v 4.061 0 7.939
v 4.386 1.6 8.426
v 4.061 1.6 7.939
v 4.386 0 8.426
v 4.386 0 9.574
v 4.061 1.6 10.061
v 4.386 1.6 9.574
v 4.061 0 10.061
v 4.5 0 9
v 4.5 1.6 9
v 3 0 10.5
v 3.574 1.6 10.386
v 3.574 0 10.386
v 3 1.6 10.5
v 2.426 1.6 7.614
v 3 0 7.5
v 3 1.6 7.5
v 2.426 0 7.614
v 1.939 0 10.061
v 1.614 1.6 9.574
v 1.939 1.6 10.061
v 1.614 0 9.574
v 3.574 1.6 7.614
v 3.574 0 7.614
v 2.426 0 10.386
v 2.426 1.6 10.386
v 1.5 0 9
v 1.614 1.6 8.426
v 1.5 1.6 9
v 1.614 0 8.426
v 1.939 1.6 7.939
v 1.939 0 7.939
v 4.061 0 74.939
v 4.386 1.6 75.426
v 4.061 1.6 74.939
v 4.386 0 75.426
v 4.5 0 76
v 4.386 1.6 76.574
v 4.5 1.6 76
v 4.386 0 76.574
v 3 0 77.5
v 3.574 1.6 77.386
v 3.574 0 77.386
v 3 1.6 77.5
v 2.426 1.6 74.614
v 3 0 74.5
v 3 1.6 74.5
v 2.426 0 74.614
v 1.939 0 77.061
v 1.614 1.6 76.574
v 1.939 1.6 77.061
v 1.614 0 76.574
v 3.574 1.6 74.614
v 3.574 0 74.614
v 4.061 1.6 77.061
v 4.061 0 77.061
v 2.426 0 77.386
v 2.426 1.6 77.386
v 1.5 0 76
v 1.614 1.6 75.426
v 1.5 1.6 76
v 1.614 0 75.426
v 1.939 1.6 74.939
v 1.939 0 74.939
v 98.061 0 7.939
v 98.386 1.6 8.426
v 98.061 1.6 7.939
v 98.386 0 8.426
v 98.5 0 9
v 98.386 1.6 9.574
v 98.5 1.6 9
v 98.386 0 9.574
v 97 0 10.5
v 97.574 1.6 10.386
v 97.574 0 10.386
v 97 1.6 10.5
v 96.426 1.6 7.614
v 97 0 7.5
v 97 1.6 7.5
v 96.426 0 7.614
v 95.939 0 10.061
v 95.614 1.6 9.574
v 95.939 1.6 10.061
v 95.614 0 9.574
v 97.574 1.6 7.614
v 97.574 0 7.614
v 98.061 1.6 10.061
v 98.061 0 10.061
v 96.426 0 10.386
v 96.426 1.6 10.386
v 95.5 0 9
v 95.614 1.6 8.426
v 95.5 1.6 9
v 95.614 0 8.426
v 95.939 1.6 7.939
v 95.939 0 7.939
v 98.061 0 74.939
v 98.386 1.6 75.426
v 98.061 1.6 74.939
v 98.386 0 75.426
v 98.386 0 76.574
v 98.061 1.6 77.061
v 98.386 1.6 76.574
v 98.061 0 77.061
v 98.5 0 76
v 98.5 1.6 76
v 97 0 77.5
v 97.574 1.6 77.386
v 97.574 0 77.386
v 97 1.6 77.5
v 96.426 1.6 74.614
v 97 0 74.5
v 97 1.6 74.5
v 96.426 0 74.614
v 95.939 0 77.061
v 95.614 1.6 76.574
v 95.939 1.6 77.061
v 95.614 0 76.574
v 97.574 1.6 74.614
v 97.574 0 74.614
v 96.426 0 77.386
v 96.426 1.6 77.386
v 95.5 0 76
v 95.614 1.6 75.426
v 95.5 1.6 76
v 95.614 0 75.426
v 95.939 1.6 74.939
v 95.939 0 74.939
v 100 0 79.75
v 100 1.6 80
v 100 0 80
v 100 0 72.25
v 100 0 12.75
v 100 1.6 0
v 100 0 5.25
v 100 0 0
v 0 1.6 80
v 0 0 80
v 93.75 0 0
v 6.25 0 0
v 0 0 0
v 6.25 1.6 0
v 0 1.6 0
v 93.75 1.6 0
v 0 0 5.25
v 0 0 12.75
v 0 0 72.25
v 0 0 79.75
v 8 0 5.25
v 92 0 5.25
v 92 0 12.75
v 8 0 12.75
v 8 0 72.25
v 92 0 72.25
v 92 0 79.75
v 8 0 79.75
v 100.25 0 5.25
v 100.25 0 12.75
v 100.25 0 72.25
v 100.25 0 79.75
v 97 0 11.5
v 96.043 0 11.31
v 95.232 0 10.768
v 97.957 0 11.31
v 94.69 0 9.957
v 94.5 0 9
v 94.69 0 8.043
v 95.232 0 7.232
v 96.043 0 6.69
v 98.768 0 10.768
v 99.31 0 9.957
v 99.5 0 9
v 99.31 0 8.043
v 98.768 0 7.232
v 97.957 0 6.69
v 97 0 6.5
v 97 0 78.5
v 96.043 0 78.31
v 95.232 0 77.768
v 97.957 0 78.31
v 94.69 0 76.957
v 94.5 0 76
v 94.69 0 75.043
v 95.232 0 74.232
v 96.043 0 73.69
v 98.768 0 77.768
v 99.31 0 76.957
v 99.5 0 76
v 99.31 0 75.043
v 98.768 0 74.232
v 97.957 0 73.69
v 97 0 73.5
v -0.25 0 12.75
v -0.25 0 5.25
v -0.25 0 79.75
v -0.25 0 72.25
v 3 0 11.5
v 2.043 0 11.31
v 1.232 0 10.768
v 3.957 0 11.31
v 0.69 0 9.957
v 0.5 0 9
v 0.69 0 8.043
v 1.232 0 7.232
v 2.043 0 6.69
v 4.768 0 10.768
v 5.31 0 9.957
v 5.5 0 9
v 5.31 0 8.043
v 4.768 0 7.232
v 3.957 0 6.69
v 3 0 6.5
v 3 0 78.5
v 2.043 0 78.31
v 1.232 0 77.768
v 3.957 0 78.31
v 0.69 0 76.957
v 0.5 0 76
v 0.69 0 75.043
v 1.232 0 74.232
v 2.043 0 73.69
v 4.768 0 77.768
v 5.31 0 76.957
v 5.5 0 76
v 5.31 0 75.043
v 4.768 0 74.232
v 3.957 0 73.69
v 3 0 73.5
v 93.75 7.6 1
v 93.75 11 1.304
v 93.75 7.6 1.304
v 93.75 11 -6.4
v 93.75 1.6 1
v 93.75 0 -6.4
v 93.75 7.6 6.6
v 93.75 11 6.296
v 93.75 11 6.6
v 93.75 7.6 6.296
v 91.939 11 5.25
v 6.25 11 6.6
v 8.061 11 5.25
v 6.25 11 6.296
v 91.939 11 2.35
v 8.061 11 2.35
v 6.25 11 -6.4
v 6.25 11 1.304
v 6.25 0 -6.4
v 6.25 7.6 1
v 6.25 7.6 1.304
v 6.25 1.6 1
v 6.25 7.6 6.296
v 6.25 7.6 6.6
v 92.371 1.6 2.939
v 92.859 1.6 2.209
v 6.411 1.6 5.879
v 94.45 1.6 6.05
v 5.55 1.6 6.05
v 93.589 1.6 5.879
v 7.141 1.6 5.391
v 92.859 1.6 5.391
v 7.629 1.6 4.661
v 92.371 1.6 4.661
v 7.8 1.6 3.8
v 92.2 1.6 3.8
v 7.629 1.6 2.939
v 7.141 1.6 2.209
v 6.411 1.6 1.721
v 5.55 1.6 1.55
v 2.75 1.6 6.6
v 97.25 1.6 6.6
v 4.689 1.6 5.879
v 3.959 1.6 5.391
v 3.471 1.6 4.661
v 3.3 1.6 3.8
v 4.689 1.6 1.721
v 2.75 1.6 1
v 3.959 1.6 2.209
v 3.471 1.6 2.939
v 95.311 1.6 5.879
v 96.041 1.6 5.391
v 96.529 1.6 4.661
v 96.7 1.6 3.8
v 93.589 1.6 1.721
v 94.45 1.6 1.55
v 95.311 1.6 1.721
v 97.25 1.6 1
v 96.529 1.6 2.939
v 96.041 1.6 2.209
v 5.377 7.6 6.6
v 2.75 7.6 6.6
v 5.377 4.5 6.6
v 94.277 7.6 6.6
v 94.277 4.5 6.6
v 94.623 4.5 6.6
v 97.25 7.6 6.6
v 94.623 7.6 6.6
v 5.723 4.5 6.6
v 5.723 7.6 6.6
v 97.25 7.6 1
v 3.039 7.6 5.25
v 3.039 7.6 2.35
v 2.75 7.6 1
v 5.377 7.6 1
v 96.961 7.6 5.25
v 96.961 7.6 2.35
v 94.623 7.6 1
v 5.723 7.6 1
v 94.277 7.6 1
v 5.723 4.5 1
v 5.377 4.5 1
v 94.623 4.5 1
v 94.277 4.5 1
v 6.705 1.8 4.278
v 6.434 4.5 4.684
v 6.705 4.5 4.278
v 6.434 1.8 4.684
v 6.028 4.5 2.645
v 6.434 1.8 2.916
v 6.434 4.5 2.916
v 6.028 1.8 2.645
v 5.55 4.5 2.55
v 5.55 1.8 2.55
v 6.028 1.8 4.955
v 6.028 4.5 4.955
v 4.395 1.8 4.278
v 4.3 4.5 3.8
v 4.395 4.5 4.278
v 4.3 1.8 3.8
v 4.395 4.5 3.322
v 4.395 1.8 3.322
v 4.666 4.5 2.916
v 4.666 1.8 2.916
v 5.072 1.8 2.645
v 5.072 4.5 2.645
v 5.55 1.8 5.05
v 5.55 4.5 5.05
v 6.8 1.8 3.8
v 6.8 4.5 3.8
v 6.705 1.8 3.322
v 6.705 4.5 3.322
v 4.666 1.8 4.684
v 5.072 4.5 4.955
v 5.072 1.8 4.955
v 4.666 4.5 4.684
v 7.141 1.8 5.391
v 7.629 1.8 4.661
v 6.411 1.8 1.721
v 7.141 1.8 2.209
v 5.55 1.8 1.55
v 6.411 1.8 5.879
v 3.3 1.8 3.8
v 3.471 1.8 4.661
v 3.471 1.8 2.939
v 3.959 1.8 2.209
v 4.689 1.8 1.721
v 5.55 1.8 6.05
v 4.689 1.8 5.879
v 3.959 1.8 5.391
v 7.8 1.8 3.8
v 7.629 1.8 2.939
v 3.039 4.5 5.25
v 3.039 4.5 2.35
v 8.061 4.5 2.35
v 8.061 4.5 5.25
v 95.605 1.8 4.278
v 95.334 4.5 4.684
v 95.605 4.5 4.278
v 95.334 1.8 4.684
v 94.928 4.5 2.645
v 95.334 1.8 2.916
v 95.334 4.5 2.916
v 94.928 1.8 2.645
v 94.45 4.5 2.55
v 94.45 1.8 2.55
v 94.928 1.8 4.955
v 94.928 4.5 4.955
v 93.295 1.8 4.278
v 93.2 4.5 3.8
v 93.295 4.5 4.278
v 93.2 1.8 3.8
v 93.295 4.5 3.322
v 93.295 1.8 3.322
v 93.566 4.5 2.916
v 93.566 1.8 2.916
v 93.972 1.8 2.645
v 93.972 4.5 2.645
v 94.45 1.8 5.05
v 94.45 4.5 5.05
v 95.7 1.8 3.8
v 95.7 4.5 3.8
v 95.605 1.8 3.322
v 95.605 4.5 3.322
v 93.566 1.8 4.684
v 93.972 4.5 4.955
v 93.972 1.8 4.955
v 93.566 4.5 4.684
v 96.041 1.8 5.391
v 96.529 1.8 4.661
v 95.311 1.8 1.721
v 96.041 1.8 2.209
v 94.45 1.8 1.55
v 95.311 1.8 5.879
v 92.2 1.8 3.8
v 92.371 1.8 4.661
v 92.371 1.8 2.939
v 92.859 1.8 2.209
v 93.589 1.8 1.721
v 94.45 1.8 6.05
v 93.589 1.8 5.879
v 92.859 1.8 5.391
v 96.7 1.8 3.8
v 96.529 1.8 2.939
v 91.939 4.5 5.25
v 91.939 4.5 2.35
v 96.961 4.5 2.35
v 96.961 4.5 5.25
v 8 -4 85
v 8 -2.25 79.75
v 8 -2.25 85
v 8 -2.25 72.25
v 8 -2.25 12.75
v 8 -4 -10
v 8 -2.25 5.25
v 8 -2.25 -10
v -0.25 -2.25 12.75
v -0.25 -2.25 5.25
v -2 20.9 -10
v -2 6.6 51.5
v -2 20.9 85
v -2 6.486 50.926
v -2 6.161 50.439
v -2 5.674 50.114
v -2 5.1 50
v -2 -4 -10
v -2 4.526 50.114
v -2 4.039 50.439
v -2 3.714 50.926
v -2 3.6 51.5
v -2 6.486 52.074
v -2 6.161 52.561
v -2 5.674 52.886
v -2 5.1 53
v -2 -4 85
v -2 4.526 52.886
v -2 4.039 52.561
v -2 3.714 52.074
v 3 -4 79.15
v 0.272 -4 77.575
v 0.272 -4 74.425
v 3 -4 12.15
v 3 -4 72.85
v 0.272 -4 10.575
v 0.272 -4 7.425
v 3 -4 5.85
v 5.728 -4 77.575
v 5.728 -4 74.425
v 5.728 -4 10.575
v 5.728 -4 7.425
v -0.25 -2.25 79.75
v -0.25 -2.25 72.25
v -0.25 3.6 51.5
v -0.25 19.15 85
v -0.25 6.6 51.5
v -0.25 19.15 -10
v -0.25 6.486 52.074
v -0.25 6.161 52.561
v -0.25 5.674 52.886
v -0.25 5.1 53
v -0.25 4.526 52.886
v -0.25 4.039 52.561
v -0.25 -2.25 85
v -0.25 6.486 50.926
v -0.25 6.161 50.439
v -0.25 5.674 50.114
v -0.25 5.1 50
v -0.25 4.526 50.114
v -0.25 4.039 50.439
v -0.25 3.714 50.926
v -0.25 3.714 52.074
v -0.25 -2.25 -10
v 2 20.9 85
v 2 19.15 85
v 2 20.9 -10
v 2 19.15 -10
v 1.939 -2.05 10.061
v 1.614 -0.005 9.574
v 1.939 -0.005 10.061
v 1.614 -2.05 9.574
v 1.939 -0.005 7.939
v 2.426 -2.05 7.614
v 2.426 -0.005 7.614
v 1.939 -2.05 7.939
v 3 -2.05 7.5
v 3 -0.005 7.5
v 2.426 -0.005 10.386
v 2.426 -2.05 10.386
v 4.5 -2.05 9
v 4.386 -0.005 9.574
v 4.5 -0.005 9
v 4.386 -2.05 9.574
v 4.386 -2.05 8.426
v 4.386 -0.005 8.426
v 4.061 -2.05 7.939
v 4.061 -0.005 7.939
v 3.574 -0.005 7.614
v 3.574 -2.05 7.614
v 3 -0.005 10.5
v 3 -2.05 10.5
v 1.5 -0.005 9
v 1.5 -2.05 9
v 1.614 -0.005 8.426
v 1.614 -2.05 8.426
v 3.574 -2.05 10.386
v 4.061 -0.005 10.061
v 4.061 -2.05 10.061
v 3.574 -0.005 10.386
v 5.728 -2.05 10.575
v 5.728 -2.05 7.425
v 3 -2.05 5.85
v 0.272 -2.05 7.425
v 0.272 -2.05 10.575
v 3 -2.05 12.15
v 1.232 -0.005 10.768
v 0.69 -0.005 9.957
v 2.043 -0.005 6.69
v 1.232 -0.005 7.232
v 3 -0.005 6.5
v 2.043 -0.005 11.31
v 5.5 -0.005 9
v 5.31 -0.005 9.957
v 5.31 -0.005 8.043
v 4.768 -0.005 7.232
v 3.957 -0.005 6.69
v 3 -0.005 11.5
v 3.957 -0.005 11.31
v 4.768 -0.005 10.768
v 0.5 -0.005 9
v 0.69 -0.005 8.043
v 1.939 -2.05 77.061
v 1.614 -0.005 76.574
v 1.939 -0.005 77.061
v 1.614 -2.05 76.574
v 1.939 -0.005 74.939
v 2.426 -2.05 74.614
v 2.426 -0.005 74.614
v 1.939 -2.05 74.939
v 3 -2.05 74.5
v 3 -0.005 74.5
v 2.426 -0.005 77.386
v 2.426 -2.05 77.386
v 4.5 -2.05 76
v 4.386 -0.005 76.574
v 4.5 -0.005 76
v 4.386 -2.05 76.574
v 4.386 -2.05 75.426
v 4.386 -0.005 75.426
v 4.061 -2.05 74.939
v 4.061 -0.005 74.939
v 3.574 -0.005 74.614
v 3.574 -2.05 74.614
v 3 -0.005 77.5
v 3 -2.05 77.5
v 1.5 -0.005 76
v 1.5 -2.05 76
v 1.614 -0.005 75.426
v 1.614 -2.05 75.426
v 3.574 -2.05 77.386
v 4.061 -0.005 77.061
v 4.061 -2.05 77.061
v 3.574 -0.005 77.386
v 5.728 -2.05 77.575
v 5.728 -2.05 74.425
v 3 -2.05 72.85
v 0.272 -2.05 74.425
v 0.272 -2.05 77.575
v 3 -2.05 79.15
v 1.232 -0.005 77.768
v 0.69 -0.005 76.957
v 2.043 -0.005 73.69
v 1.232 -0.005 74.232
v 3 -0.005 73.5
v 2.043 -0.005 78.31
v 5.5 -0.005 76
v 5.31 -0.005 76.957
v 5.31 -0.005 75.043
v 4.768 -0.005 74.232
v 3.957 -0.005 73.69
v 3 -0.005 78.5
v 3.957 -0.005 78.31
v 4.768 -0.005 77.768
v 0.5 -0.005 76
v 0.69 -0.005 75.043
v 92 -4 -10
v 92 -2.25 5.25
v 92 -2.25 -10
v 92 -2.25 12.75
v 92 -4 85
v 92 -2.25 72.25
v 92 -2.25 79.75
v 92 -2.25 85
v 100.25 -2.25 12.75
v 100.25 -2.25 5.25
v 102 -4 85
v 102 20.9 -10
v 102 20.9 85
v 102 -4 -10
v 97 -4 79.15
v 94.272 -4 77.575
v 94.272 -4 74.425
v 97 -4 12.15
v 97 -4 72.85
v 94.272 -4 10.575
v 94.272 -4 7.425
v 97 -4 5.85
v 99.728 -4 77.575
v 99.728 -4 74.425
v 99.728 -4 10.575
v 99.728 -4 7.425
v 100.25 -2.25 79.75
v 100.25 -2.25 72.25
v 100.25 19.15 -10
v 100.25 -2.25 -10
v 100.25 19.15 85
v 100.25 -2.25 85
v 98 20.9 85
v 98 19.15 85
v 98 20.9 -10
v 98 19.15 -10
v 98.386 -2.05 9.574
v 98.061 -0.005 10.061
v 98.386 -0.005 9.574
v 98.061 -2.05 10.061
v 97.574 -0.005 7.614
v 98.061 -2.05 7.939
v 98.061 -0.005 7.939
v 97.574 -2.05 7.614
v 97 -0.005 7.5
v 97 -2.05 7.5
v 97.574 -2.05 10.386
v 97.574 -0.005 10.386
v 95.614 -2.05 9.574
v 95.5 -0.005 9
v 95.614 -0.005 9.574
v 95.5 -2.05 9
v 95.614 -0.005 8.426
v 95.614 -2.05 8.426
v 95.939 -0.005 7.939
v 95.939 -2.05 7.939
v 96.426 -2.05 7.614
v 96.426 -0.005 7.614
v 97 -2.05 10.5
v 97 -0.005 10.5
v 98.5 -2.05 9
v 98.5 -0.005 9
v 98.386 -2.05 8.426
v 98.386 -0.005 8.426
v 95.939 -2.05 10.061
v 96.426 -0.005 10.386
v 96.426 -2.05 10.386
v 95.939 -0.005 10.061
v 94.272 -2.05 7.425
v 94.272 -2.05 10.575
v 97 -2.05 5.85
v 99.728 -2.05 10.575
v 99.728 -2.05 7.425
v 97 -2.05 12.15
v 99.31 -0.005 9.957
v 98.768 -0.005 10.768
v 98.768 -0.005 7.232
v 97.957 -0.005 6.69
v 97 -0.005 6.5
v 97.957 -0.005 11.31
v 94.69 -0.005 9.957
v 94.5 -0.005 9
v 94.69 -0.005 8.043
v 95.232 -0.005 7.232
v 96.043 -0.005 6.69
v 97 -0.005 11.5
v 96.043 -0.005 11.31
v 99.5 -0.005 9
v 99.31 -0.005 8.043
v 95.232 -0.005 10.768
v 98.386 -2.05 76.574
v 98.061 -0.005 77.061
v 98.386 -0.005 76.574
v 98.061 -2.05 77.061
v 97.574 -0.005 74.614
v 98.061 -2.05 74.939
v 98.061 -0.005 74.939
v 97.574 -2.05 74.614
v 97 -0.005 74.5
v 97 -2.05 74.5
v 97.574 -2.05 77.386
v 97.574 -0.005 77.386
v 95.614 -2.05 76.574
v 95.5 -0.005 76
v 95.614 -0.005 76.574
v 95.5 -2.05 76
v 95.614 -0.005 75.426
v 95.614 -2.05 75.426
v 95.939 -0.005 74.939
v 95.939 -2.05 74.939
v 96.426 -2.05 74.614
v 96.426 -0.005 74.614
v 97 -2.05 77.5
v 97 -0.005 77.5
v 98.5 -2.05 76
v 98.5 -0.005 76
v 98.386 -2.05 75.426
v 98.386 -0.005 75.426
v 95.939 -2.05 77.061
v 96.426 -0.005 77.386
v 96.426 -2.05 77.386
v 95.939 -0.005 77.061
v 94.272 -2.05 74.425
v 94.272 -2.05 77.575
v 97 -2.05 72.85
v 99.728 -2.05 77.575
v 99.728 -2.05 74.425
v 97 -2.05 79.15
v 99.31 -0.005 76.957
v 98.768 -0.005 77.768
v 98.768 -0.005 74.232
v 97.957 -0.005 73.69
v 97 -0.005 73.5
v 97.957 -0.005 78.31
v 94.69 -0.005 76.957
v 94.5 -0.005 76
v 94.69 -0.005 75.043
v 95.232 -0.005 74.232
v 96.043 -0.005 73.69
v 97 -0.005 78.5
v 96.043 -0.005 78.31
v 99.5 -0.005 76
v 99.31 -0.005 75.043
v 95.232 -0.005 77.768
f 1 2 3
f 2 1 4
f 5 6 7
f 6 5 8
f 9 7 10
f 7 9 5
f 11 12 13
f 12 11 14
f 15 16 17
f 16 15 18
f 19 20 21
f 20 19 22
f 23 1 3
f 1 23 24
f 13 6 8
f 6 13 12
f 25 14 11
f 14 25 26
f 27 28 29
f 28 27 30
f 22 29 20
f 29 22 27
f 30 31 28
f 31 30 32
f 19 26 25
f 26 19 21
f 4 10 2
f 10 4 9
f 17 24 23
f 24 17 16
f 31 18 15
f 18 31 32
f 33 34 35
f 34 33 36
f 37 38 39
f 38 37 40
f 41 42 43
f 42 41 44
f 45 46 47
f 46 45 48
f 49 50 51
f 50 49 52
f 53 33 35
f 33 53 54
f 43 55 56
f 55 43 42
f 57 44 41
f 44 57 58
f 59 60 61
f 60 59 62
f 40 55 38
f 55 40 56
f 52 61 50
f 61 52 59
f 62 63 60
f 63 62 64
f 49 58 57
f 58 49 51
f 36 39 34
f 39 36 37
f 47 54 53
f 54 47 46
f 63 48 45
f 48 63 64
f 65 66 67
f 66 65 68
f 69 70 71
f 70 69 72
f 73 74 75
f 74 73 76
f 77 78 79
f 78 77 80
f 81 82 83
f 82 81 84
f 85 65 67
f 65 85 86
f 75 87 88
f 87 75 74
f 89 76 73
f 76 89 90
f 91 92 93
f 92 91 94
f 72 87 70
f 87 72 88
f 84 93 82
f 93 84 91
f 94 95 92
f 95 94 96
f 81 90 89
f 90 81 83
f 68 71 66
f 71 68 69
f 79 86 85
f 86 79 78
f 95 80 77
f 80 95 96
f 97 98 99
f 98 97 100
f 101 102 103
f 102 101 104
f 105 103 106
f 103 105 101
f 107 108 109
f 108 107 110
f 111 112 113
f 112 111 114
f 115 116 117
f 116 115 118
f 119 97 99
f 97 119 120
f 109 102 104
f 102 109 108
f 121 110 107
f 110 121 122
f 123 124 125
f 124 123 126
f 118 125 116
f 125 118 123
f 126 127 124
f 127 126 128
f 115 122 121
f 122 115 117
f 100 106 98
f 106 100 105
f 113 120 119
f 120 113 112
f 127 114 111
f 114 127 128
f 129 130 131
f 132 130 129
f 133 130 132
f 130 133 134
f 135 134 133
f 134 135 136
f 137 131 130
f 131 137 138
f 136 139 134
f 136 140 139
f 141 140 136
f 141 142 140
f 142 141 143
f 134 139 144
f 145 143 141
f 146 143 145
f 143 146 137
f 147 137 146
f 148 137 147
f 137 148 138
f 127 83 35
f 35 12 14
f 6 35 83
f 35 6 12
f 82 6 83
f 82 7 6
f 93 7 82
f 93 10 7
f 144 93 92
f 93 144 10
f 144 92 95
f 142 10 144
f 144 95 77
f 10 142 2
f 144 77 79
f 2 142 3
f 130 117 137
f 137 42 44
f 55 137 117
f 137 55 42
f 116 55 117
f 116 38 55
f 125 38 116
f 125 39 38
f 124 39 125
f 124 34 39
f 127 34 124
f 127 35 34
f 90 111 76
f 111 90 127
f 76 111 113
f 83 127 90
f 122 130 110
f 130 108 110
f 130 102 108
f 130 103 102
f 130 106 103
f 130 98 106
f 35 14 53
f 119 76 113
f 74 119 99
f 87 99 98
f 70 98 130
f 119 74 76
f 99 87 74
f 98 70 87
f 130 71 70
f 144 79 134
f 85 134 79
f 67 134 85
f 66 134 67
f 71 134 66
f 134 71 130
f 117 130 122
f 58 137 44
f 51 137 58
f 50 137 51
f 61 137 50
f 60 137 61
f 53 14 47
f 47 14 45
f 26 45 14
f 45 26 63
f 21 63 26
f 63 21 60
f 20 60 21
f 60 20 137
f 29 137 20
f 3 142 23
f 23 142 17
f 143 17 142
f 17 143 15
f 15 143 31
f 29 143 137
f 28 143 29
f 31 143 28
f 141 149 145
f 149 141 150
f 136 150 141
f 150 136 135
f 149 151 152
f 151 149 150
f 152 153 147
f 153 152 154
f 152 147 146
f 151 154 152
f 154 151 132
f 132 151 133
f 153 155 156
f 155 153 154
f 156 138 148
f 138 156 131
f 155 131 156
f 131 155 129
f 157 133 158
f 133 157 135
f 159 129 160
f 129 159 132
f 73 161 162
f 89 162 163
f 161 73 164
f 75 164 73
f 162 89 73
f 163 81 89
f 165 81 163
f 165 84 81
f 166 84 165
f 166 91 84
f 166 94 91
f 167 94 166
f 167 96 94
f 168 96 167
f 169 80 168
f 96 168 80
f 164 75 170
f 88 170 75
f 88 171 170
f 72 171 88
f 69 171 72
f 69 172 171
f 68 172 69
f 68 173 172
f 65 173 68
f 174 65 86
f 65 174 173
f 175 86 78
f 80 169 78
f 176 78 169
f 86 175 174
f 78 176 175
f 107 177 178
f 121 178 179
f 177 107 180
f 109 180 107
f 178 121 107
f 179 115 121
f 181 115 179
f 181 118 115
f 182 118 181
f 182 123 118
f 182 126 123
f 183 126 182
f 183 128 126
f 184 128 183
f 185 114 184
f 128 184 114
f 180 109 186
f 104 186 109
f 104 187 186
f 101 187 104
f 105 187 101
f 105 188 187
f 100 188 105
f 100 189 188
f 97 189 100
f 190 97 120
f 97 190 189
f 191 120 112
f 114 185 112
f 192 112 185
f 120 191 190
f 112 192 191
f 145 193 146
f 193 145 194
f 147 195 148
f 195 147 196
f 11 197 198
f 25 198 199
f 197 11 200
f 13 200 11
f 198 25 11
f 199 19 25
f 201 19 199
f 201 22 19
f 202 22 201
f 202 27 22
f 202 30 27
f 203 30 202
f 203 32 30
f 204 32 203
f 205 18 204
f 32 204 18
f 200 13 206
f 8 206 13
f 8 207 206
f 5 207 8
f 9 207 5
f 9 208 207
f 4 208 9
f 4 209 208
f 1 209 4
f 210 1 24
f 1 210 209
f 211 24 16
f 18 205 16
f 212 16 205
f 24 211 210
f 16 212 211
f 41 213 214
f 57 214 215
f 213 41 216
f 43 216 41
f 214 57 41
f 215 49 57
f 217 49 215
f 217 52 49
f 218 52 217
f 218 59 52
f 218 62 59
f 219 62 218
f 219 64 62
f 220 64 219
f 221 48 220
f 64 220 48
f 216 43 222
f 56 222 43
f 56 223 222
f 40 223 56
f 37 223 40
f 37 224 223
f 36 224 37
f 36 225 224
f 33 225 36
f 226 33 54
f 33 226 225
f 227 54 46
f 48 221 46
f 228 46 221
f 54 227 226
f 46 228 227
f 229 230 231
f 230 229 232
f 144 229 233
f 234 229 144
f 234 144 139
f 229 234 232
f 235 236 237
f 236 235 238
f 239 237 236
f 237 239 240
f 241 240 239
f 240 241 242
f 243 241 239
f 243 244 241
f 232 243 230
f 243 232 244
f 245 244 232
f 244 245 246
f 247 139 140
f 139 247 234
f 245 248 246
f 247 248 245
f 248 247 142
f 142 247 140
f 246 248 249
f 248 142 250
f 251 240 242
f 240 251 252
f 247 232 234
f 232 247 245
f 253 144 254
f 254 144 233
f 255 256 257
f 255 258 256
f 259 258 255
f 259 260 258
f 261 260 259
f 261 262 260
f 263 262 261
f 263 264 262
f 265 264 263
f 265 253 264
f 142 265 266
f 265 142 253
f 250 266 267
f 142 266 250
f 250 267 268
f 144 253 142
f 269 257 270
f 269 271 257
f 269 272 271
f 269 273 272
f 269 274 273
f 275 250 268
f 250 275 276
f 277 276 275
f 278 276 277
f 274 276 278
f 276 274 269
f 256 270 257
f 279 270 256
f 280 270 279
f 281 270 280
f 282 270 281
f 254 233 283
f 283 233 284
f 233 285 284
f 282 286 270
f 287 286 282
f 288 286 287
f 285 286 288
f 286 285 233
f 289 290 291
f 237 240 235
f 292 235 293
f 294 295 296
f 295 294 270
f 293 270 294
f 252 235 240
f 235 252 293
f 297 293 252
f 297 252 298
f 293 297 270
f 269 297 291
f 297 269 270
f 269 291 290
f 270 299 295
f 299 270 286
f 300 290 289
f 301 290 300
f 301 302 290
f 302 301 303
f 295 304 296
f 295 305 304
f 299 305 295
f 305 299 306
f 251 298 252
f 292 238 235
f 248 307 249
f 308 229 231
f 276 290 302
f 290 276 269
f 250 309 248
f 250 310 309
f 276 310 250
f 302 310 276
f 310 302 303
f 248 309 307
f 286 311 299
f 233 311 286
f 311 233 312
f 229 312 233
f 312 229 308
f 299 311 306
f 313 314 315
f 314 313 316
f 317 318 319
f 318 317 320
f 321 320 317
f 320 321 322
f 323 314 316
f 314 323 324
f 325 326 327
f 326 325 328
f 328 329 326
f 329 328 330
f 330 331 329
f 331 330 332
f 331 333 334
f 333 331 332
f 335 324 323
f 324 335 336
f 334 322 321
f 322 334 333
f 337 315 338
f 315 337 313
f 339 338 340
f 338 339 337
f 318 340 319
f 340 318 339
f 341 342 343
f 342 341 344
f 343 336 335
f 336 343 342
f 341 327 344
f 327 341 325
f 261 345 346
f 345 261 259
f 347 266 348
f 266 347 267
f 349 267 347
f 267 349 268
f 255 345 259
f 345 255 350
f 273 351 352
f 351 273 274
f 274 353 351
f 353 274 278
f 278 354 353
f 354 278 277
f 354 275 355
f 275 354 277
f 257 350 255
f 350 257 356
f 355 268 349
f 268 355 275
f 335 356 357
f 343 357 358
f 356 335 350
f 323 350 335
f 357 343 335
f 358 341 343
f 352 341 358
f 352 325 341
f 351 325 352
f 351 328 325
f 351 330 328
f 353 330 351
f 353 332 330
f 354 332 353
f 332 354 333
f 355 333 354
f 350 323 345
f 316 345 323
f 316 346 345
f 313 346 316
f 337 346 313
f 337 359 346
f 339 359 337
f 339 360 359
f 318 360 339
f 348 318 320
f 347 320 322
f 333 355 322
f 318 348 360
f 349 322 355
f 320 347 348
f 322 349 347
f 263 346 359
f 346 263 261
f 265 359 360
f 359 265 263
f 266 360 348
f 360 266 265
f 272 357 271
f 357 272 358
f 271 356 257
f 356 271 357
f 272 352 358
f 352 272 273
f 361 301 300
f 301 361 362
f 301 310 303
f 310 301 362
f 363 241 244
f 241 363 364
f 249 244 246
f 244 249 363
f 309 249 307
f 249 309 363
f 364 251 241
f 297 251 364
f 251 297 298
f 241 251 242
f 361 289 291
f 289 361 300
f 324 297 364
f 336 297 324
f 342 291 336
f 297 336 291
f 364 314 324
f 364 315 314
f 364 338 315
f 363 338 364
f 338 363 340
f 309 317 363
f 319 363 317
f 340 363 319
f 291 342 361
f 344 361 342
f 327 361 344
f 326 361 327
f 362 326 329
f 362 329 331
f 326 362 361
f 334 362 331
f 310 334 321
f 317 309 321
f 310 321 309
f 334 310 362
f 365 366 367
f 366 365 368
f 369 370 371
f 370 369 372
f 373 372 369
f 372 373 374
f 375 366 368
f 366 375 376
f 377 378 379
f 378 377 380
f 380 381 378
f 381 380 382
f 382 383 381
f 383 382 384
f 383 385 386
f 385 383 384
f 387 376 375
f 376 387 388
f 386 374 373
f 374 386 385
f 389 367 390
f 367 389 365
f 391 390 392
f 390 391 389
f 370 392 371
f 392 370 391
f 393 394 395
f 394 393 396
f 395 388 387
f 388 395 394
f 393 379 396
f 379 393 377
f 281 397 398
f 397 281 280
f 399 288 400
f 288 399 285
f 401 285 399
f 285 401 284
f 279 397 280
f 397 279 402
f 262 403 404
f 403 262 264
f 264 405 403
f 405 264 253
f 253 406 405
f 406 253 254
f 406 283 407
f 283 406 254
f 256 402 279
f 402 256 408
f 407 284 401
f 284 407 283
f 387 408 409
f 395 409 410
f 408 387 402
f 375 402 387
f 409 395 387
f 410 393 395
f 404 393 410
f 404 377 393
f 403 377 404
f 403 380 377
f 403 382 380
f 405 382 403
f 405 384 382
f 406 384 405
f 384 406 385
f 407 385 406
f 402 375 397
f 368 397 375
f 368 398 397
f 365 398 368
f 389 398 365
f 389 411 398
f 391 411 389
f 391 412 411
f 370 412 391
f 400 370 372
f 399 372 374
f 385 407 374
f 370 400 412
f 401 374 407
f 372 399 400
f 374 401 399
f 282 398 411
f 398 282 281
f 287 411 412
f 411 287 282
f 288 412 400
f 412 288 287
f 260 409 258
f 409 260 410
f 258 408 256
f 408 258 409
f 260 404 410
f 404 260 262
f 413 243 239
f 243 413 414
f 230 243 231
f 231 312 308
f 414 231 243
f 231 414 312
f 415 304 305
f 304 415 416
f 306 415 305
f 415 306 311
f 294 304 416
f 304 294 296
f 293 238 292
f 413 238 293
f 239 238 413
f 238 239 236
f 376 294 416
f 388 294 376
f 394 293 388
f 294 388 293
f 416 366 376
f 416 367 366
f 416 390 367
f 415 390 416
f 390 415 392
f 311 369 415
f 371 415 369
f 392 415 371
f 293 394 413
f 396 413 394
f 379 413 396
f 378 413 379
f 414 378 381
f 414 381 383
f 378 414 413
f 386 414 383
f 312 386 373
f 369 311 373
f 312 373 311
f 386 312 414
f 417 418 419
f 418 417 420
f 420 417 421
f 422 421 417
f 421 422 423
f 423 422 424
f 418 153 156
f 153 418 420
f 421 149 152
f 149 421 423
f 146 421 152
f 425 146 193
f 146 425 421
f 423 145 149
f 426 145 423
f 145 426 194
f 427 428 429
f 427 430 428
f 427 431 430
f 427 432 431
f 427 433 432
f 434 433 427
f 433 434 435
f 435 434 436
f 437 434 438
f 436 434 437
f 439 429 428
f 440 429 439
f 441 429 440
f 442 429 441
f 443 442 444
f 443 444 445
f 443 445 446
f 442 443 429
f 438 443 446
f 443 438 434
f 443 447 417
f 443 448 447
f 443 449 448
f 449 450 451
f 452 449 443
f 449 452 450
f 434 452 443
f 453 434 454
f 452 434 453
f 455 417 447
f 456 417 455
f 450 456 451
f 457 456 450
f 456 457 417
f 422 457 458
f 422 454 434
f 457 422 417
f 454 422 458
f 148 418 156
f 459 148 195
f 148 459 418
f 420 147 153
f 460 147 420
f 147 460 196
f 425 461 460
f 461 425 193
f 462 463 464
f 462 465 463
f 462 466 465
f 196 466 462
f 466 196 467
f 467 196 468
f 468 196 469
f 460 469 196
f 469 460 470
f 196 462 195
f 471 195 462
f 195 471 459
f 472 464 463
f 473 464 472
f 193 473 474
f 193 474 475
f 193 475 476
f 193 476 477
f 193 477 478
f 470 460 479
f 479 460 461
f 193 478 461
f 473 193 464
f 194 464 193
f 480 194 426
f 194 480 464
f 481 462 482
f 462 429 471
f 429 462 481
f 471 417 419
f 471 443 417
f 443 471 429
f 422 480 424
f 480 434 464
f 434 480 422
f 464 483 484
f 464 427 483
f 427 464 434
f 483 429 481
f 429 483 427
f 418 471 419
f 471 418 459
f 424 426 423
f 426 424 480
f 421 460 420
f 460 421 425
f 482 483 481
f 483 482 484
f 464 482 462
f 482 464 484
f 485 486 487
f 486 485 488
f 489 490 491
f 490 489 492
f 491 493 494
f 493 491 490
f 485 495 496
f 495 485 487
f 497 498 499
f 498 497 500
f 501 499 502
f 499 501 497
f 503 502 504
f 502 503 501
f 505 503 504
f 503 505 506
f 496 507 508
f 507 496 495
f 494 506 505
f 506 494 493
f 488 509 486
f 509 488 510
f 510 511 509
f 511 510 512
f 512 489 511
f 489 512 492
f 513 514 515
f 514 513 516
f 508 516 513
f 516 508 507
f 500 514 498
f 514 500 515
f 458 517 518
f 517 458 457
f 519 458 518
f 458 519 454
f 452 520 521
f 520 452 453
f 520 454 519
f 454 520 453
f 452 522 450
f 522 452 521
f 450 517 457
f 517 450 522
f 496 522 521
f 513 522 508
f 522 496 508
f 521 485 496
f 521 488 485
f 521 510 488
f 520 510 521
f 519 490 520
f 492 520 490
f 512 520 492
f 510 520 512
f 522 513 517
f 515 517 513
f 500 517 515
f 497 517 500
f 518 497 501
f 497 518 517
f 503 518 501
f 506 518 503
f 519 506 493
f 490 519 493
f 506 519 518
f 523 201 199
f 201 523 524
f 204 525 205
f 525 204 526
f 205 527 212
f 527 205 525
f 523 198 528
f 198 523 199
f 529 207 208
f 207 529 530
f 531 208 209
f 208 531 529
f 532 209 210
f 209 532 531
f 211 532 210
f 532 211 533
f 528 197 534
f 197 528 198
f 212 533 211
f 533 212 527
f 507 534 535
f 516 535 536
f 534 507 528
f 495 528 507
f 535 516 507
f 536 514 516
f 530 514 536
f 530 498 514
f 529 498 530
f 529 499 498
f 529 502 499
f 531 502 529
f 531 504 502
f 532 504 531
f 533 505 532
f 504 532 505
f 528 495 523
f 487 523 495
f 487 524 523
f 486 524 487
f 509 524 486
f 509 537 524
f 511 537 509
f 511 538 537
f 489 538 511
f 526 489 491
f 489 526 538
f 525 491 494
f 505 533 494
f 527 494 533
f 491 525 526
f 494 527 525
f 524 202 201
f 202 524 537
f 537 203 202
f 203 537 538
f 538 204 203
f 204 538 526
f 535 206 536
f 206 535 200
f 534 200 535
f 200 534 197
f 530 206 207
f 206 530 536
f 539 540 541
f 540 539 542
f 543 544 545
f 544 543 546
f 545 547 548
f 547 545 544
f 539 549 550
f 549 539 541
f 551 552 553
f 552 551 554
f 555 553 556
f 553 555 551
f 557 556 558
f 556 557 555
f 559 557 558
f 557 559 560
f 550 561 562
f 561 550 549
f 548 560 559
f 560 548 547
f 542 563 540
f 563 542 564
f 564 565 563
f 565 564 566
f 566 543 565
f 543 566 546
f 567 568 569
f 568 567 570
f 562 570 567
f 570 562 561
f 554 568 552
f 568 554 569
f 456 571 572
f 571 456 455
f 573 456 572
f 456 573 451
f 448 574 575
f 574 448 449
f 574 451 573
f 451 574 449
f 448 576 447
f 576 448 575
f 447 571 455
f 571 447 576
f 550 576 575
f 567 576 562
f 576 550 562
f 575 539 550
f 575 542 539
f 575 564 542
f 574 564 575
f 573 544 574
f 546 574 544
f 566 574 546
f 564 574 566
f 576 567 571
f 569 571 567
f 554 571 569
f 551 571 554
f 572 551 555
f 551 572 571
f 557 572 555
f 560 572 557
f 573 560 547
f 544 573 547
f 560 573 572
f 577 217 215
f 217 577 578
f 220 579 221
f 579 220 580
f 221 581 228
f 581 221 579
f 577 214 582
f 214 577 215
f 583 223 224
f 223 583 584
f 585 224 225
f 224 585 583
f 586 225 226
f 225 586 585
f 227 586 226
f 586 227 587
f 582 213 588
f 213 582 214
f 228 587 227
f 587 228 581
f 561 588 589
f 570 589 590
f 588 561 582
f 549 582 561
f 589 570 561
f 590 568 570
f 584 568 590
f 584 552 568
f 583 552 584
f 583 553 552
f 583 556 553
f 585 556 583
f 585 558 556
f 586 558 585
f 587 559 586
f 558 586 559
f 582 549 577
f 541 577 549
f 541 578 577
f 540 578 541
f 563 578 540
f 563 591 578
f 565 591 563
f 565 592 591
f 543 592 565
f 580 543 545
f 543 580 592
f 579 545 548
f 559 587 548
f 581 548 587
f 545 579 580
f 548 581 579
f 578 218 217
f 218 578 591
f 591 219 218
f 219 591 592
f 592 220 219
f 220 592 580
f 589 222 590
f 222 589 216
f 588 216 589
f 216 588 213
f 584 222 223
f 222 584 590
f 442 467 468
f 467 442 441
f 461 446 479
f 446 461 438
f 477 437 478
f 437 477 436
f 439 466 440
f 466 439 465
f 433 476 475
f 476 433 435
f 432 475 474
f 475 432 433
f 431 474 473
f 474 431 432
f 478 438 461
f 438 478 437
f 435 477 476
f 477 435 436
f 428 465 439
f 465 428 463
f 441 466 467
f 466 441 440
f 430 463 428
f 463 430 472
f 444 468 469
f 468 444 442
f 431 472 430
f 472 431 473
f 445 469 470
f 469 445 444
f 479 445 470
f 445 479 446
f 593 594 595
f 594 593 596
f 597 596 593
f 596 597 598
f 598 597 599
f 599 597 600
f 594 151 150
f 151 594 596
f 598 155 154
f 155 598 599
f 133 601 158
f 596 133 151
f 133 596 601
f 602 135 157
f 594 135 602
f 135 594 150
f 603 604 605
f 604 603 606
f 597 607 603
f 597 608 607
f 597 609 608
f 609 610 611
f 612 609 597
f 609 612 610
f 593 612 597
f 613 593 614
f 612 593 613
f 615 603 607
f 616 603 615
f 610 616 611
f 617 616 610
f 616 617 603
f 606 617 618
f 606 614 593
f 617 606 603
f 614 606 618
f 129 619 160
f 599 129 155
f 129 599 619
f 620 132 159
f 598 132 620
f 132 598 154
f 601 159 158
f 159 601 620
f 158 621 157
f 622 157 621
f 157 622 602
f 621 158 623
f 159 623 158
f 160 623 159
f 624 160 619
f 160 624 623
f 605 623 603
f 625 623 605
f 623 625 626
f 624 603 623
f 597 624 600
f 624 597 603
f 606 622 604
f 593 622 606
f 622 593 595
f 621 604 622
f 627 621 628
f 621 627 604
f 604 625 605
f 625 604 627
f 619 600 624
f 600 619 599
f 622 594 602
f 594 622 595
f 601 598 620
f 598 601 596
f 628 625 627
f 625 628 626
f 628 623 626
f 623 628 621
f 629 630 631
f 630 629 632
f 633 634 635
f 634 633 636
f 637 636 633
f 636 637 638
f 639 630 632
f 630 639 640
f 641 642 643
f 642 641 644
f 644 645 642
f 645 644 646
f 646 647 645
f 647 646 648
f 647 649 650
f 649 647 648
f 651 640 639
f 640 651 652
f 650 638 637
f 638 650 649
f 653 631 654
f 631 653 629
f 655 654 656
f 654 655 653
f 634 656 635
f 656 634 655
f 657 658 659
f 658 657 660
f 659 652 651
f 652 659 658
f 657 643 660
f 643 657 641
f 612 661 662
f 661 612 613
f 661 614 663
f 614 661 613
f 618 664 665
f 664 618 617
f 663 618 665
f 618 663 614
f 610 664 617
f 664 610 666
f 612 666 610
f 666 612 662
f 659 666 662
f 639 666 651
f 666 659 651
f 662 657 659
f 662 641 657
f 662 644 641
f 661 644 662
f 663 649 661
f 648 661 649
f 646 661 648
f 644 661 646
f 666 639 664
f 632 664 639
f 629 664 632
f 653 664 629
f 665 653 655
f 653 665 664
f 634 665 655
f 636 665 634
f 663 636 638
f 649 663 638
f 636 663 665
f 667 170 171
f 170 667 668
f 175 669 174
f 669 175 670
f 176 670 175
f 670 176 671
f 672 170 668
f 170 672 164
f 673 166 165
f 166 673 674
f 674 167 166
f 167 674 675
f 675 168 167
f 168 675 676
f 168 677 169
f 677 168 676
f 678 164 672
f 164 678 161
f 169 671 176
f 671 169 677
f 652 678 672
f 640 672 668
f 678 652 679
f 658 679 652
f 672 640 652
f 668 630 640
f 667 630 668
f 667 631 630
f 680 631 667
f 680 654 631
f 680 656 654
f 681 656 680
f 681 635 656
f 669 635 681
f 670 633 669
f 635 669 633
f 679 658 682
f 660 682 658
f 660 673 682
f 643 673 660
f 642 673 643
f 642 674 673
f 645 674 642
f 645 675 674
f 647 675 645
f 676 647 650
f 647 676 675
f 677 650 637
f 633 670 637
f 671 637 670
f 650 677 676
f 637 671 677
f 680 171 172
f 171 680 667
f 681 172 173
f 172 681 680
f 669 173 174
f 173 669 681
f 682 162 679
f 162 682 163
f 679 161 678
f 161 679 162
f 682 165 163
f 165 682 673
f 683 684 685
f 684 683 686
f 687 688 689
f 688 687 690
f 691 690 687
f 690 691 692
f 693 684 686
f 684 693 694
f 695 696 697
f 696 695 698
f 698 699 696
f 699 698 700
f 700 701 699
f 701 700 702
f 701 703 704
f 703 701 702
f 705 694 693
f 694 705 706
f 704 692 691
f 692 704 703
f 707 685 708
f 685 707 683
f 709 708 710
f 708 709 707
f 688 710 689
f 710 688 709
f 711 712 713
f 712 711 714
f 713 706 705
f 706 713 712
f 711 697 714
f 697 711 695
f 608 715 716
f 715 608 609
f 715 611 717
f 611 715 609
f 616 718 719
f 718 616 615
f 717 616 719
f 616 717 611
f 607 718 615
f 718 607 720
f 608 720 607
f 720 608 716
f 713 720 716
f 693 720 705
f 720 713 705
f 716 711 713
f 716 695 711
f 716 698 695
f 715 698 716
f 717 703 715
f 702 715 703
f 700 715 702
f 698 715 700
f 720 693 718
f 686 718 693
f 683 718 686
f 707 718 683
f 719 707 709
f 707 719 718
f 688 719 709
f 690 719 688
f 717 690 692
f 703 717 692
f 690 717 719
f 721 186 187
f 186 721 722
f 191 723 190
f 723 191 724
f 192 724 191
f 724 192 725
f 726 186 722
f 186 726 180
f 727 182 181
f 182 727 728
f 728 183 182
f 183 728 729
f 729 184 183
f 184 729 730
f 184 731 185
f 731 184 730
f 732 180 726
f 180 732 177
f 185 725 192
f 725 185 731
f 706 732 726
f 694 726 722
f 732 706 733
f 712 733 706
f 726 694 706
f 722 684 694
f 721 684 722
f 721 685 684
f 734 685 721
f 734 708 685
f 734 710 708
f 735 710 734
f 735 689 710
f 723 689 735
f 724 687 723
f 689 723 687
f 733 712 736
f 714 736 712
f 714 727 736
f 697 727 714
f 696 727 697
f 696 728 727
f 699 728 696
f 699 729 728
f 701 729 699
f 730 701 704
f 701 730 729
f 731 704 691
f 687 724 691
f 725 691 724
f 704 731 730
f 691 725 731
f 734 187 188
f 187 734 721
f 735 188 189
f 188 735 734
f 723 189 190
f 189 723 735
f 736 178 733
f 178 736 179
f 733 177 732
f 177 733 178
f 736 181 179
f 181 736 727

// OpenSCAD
// file: ../library/din41612/din41612_male.scad
// din41612 male connector
// =======================

include <din41612_male_dim.scad>

use <../linurs/linurs_screw.scad>

module din41612_male(){ 
  // color("LightGrey")
  difference(){
    union(){
        translate([0,din41612_male_w1/2,din41612_male_h/2-din41612_male_h1])  
        cube([din41612_male_l1,
              din41612_male_w1,
              din41612_male_h],
             center=true);  
      translate([0,(din41612_male_w1-din41612_male_w)/2,(din41612_male_h-din41612_male_h1)/2]) 
        cube([din41612_male_l1,
              (din41612_male_w-din41612_male_w1),
              din41612_male_h-din41612_male_h1],
             center=true);  
      translate([0,din41612_male_w2/2+din41612_male_w1-din41612_male_w,din41612_male_h2/2])
        cube([din41612_male_l,
              din41612_male_w2,
              din41612_male_h2],
             center=true);  
    }
    for(i=[-1,1]){ // mounting holes
      translate([i*din41612_male_dl/2,
                 din41612_male_w1-din41612_male_w+din41612_male_w2/2, 
                 din41612_male_h1])
      rotate([180,0,90])screw_fix(
            w=din41612_male_h2, 
            d=M2_5, 
            type=head_cyl, 
            nut_sink=din41612_male_h,
            t=0);
    }
  }
}
din41612_male();  
// file: ../library/din41612/din41612_male_dim.scad
include <../linurs/linurs_screw_dim.scad>

// connector dimensions
din41612_male_l=94.5;    // lenght of the connector
din41612_male_l1=87.5;   // 
din41612_male_w=13;      // width of the connector
din41612_male_w1=6.4;    // 
din41612_male_w2=5.6;    // 
din41612_male_h=11;      // height of the connector
din41612_male_h1=1.6;    // 
din41612_male_h2=6;      // 

din41612_male_dl=88.9;   // distance between mounting holes
// file: ../library/din41612/din41612_female_dim.scad
include <../linurs/linurs_screw_dim.scad>

// connector dimensions
din41612_female_l=95;       // lenght of the connector
din41612_female_l1=85;      // lenght of the connector head
din41612_female_h=11.6;     // height of the connector
din41612_female_h1=5.2;     // height produced by the connector when pulgged in 
din41612_female_w=11;       // width of the connector
din41612_female_w1=8.5;     // width of the connector head

din41612_female_dl=90;      // distance between mounting holes
// file: ../pcb/pcb.scad
// pcb
// ===
// The pcb is the master object and has its 
// lower left corner solder side at the origin of the 
// coordinate system 

n=2;  // [1,2,3,4,5,6,7,8]
show_pcb="assemblies"; // [assemblies,assembly,pcb]

include <pcb_dim.scad>
include <../motherboard/motherboard_dim.scad>

use <../library/din41612/din41612_male.scad>

module pcb(){
  echo("pcb");  
  color("greenyellow")
  difference(){
    cube([pcb_l,pcb_h,pcb_w]); // pcb
    for(x=[-1,1]){ // mounting holes
      for(y=[pcb_wd1,pcb_wd1+pcb_wd]){
        translate([x*pcb_ld/2+pcb_l/2,0,y])
        rotate([90,0,0])
        cylinder(d=pcb_d,h=3*pcb_h,center=true,$fn=16);
      }
    }
  }
}

module pcb_assembly(){
  echo("pcb assembly");  
  pcb();  
  translate([pcb_l/2,pcb_h,0])  
  rotate([-90,0,0])din41612_male();  
}

module pcb_assemblies(n=1){
  echo("pcb assemblies"); 
  for(i=[0:n-1]){ // add the connectors
      echo(i);
      translate([0,step*i,0])
      pcb_assembly();
  }    
}    

if(show_pcb=="assemblies"){
  pcb_assemblies(n=n);
}

if(show_pcb=="assembly"){
  pcb_assembly();
}

if(show_pcb=="pcb"){
    // Move to center to create 2D drawings from top view 
    // with script OpenSCAD22d.py
    //
    rotate([90,0,180])
    //
    translate([-pcb_l/2,-pcb_h/2,-pcb_w/2])
    pcb();
}
// file: ../bracket/bracket.scad
// bracket
// =======
// A bracket of the elecbox module
// - type: 0 front bracket, 1 rear bracket
// - width 1..n in steps

// parameters for customizer
// bracket width
n=2; // [1,2,3,4,5,6,7,8]
// type
bracket="Front"; // [Front,Back]
// intermediate mounting holes
intermediate=false;  

include <../pcb/pcb_dim.scad>

include <../motherboard/motherboard_dim.scad>
include <../library/linurs/linurs_screw_dim.scad>
include <bracket_dim.scad>

use <../library/linurs/linurs_screw.scad>
    
module back_bracket(n=1, intermediate=false){
  mirror([1,0,0])       // mirror it if desired
  front_bracket(n=n, intermediate=intermediate); 
}
    
module front_bracket(n=1, intermediate=false){
  echo("bracket");  
  //color("White")
  intermediatestep=(intermediate)?step:0; 
  difference(){
    union(){
      translate([-bracket_h2/2-bracket_gap/2,
                 bracket_w(n)/2-bracket_w1,
                 bracket_l/2])  
      cube([bracket_h2,
            bracket_w(n),
            bracket_l],center=true); // create the bracket front
  
      translate([bracket_h/2-bracket_h2-bracket_gap/2,
                 bracket_t/2-bracket_w1,
                 bracket_l/2]) 
      cube([bracket_h,
            bracket_t,
            bracket_l],center=true); // U shape side of the screw
      
      translate([bracket_h1/2-bracket_h2-bracket_gap/2,
                 bracket_w(n)-bracket_w1-bracket_t/2,
                 bracket_l/2]) 
      cube([bracket_h1,
            bracket_t,
            bracket_l],center=true); // U shape where no screw  
      for(x=[1:n]){  // create the mounting hole cubes 
        for(z=[bracket_l1,
               bracket_l1+bracket_ld]){
          translate([ bracket_h/2-bracket_h2-bracket_gap/2,
                     -bracket_w1/2+(x-1)*intermediatestep,
                     z])
          cube([bracket_h,
                bracket_w1,
                bracket_l2],center=true);
        }
      }   
    }
    for(x=[1:n]){ // create the mounting hole 
      for(z=[bracket_l1,
             bracket_l1+bracket_ld]){
        translate([bracket_h3-bracket_h2-bracket_gap/2,
                  -bracket_w1/2+(x-1)*intermediatestep,
                   z])
        rotate([0,90,0])
        rotate([-90,0,0])
        screw_fix(w=bracket_w1,d=bracket_screw,type=head_no, t=bracket_screw_gap);
      }
    }
  }
}

if(bracket=="Front"){
  front_bracket(intermediate=intermediate,n=n);
}

if(bracket=="Back"){
  back_bracket(intermediate=intermediate,n=n);
}
// file: ../library/linurs/linurs_screw.scad
// Metric screws and nuts 
// urs@linurs.org 2019
// It is targeted for 3D printing applications. 
// To look realistic is not the goal (Example: Nuts do not have a hole)

include <linurs_screw_dim.scad>

d=0; //[0:M2_5,1:M3,2:M4,3:M5]
type=0;//[0:head_cyl,1:head_cnt,2:head_no,3:head_hex]
w=15; 
i=10;
nut_sink=0;
screw_sink=0; 
t=0.01;
fn=16;

/* [hex_bolt] */
show_hex_bolt=false;

/* [nut] */
show_nut=false;

/* [screw] */
show_screw=false;

/* [screw_fix] */
show_screw_fix=false;

/* [screw_cut] */
show_screw_cut=false;

/* [nut_cut] */
show_nut_cut=false;
wi=0; 
rot=false;

// functions used multiple times to position nuts and heads
function headh_cyl(d)=screw_cyl[d][1];  // height of cyl screw head
function headh_cnt(d)=screw_cyl[d][1];  // height of cnt screw head
function headh(d,type=head_cyl)=(type==head_cyl ? headh_cyl(d) : (type==head_cnt ? headh_cnt(d) : 0 )); // height of screw head 

function nuth(d)=screw_hex[d][2];   // height of hex nut

// head of a cylinder screw
module screw_head_cyl(d=M3, t=0)
{
  screwhd=screw_cyl[d][0]+t; // diameter of cylinder screw head
  cylinder(d=screwhd,h=headh(d=d, type=head_cyl), center=true,$fn=16); // screw head
}

// head of a countersunk screw
module screw_head_cnt(d=M3, t=0)
{
  screwd=screw_d[d]+t; 
  screwhd=screw_cnt[d][0]+t; // diameter of cylinder screw head
  cylinder(d1=screwd,d2=screwhd,h=headh(d=d,type=head_cnt), center=true,$fn=16); // screw head
}

// head of a hex screw
module screw_head_hex(d=M3, t=0)
{
    translate([0,0,-nuth(d)/2])nut(d=d, t=t);
}

// head of all screws
module screw_head(d=M3, type=head_cyl, t=0)
{ 
  if(type==head_cnt){
    screw_head_cnt(d=d, t=t);
  } else {
    if(type==head_cyl){
      screw_head_cyl(d=d, t=t);
    } else {
       if(type==head_hex){
           screw_head_hex(d=d, t=t); 
       } 
    }    
  }
}

// hex bolt 
module hex_bolt(d=M3, w=10, t=0)
{
  nutd=screw_hex[d][1]+t; // outer diameter of hex bolt
  cylinder(r=nutd/2,h=w+t, center=true,$fn=6); // nut
}

// nut 
module nut(d=M3, t=0)
{
  hex_bolt(d=d, w=nuth(d), t=t);    
}

// screw 
// w outer width of the screw = screw length + head 
module screw(w=10, d=M3, type=head_cyl, t=0){
  screwd=screw_d[d]+t;       // screw diameter
  cylinder(d=screwd, h=w, center=true,$fn=16); // screw thread length
  translate([0,0,w/2-headh(d=d,type=type)/2])
  screw_head(d=d,type=type, t=t);
}

// screw fix
// w outer width of the screw = screw length + head 
// sink additional material below to remove 
// raise additional material above to remove
module screw_fix(w=10, d=M3, type=head_cyl, screw_sink=0, nut_sink=0, t=0){
  screw(w=w, d=d, type=type, t=t);
  translate([0,0,-w/2+nuth(d)/2])
    nut(d=d,t=t);
  //additional material to be removed above the nut  
  translate([0,0,-(w+nut_sink)/2])hex_bolt(d=d,w=nut_sink+0.01,t=t);    
  //additional material to be removed above the screw head
  if(type==head_cnt){  
    translate([0,0,w/2+screw_sink])
    cylinder(d=screw_cnt[d][0]+t,h=screw_sink+0.01,center=true,$fn=16);
  }else{ 
    translate([0,0,(w+screw_sink)/2])
    cylinder(d=screw_cyl[d][0]+t,h=screw_sink+0.01,center=true,$fn=16);
  }     
}

// screw cut
// material to be extracted from object to slide in a counter sunk screw for fixation
// w height of the cut out
// i depth of the screw
module screw_cut(d=M3,w=20,i=10,t=0,fn=32){
    hsh=screw_cnt[d][1];
    ws=screw_cnt[d][0]+t;
    ds=screw_d[d]+t;
    
    translate([i/2,0,-(w-hsh)/2])
      cube([i,ws,hsh],center=true);
    
    translate([0,0,-(w-hsh)/2])
      cylinder(d=ws,h=hsh,center=true,$fn=32);
    
    translate([0,0,-(w-hsh)/2+hsh])
        cylinder(d2=ds, d1=ws, h=hsh,center=true,$fn=fn);
    
    cylinder(h=w, d=ds, center=true, $fn=fn);   
    
    translate([i/2,0,0]) 
        cube([i,ds,w],center=true);
    
    for(y=[-1,1]){
        translate([i/2,y*ds/2,-w/2+hsh])
            rotate([45,0,0])
            cube([i,sqrt(2)*(ws-ds)/2,sqrt(2)*(ws-ds)/2],center=true);
    }
}
//screw_cut();

// nut cut
// material to be extracted from object to slide in a nut for fixation
// w height of the cylinder
// i lenght of the inlet
module nut_cut(w=10, wi=0, d=M3, i=10, t=0, rot=false,type=head_cyl){ 
  r=(rot)?90:0;
  ds=(rot)?screw_hex[d][1]:screw_hex[d][0];
  rotate([0,0,r])nut(d,t);
  translate([i/2,0,0])
    cube([i,ds+t,nuth(d)+t],center=true);
  translate([0,0,-wi])
      if(type==head_cnt){    
          screw(w=w, d=d, type=type, t=t); 
        translate([0,0,w/2])
          cylinder(d=screw_cnt[d][0]+t,h=raise,center=true,$fn=16);
      }
      else{ 
          screw(w=w, d=d, type=type, t=t);   
  //      translate([0,0,0])
          //#cylinder(d=screw_cyl[d][0]+t,h=w,center=true,$fn=16);
      }       
}

if(show_hex_bolt==true){
   hex_bolt(d=d, w=w, t=t);
}

if(show_nut==true){
  nut(d=d, t=t);
}    

if(show_screw==true){
   screw(w=w, d=d, type=type, t=t);
}

if(show_screw_fix==true){
  screw_fix(w=w, d=d, type=type, nut_sink=nut_sink, screw_sink=screw_sink, t=t);
}

if(show_screw_cut==true){
  screw_cut(d=d,w=w,i=i,t=t,$fn=fn);
}    

if(show_nut_cut==true){
  nut_cut(w=w, wi=wi, d=d, i=i, t=t,rot=rot,type=type);
}  
// file: ../library/linurs/linurs_screw_dim.scad
// Metric screws and nuts 
// urs@linurs.org

// contains dimensions of linurs_screw and can be included in other 
// OpenScad files 

// Parameters in this file
// d screw diameter M2_5, M3, ... (enumeration with screw_d)
// t millimeters added to diameters 

// enumerations of metric threads
M2_5=0;
M3=1;
M4=2;
M5=3;

// enumerations screw head type
head_cyl=0; // cylinder
head_cnt=1; // countrsunk
head_no=2;  // no head at all
head_hex=3;  // no head at all

// screw diameters
screw_d=[
2.5, // M2.5
3.0, // M3
4.0, // M4
5.0  // M5
];

// sizes for hex nuts
screw_hex=[
//   s,   e,   h
 [ 5.0, 5.8, 1.7], // M2.5
 [ 5.5, 6.4, 2.0], // M3
 [ 7.0, 8.1, 2.8], // M4
 [ 8.0, 9.2, 3.5]  // M5
];

// sizes for cylinder screw heads
screw_cyl=[
//   d,   h
 [ 4.5, 1.6], // M2.5
 [ 5.5, 2.0], // M3
 [ 7.0, 2.6], // M4
 [ 8.5, 3.3]  // M5
];

// sizes for countersunk screw heads
screw_cnt=[
//   d,   h
 [ 4.7, 1.50], // M2.5
 [ 5.6, 1.65], // M3
 [ 7.4, 2.20], // M4
 [ 9.2, 2.50]  // M5
];
// file: ../motherboard/motherboard_dim.scad
include <../library/linurs/linurs_screw_dim.scad>
include <../library/din41612/din41612_female_dim.scad>
include <../library/din41612/din41612_male_dim.scad>
include <../pcb/pcb_dim.scad>
// motherboard pcb dimensions
motherboard_l=pcb_l;   // pcb width
motherboard_h=1.6;     // pcb thickness
step=25.4;             // distance between modules

function motherboard_w(n)=din41612_female_w+step*(n-1);

screw_motherboard_d=M2_5;
screw_motherboard_l=16;
motherboard_pass=0.5;// gap to fit screws 

motherboard_z_offset=-din41612_male_w1-din41612_female_h1-motherboard_h;
// file: ../bracket/bracket_dim.scad
// bracket

include <../pcb/pcb_dim.scad>
include <../motherboard/motherboard_dim.scad>
include <../library/linurs/linurs_screw_dim.scad>

bracket_screw=M2_5;   // hole for the screw

bracket_gap=0.5;      // gap between bracket to make sure it fits in the box
bracket_screw_gap=0.5;// gap to fit the screw

bracket_l=pcb_w+15;   // height of bracket
bracket_l1=19;        // hole l
bracket_l2=3*screw_d[bracket_screw];
bracket_ld=pcb_wd;    // hole distance

bracket_h=10;         // depth of the U shape at the side of the screw
bracket_h1=4;         // depth of the U shape at the side where no screw is 
bracket_h2=2-bracket_gap/2;   // thickness of bracket
bracket_h3=5;         // hole h

bracket_w1=4;         // height of the mounting hole cube
bracket_tn=2;         // thickness of bracket
bracket_t=bracket_tn-bracket_gap/2;  // thickness of bracket - gap

bracket_offset_z=-10;  // bracket offset in elecbox z axis

function bracket_w(n)=step*n-bracket_gap;
function bracket_w2(n)=step*n-2*bracket_tn;
// file: ../pcb/pcb_dim.scad
// The pcb is the master object of the project
// therefore no other include files from other objects
// are necessary

// pcb constants
pcb_l =100;  // lenght of the pcb
pcb_ld = 94; // hole distance 
pcb_w=80;    // height of the pcb
pcb_wd = 67; // hole distance
pcb_wd1 = 9; // hole to edge distance 
pcb_d=3;     // diameter of holes
pcb_h=1.6;   // thickness
// main file
// Bluetooth module
// ==========

Bluetooth="assembly"; // [assembly,front,back,print_front,print_back]

include <../pcb/pcb_dim.scad>
include <../bracket/bracket_dim.scad>
include <../motherboard/motherboard_dim.scad>
include <../library/linurs/linurs_screw_dim.scad>

use <../library/linurs/linurs_screw.scad>
use <../bracket/bracket.scad>
use <../pcb/pcb.scad>

module Bluetooth_back(){
    translate([0,0,bracket_offset_z])back_bracket(n=1);
}

module Bluetooth_front(){
    d=3;
    h=3.5;
    z=51.5;
       
    difference(){
        translate([0,0,bracket_offset_z])front_bracket(n=1);
        
        translate([
          0,
          h+pcb_h,
          z])rotate([0,90,0])
          cylinder(h=bracket_h,d=d,center=true, $fn=16);       
    }
}

module Bluetooth_assembly(){
    pcb_assembly();
    Bluetooth_front();
    translate([pcb_l,0,0])Bluetooth_back();
}

if(Bluetooth=="front"){
  Bluetooth_front();
}

if(Bluetooth=="back"){
  Bluetooth_back();
}

if(Bluetooth=="assembly"){
  Bluetooth_assembly();
}

if(Bluetooth=="print_front"){
  rotate([0,-90,0])
    Bluetooth_front();
}

if(Bluetooth=="print_back"){
  rotate([0,90,0])Bluetooth_back();
}
